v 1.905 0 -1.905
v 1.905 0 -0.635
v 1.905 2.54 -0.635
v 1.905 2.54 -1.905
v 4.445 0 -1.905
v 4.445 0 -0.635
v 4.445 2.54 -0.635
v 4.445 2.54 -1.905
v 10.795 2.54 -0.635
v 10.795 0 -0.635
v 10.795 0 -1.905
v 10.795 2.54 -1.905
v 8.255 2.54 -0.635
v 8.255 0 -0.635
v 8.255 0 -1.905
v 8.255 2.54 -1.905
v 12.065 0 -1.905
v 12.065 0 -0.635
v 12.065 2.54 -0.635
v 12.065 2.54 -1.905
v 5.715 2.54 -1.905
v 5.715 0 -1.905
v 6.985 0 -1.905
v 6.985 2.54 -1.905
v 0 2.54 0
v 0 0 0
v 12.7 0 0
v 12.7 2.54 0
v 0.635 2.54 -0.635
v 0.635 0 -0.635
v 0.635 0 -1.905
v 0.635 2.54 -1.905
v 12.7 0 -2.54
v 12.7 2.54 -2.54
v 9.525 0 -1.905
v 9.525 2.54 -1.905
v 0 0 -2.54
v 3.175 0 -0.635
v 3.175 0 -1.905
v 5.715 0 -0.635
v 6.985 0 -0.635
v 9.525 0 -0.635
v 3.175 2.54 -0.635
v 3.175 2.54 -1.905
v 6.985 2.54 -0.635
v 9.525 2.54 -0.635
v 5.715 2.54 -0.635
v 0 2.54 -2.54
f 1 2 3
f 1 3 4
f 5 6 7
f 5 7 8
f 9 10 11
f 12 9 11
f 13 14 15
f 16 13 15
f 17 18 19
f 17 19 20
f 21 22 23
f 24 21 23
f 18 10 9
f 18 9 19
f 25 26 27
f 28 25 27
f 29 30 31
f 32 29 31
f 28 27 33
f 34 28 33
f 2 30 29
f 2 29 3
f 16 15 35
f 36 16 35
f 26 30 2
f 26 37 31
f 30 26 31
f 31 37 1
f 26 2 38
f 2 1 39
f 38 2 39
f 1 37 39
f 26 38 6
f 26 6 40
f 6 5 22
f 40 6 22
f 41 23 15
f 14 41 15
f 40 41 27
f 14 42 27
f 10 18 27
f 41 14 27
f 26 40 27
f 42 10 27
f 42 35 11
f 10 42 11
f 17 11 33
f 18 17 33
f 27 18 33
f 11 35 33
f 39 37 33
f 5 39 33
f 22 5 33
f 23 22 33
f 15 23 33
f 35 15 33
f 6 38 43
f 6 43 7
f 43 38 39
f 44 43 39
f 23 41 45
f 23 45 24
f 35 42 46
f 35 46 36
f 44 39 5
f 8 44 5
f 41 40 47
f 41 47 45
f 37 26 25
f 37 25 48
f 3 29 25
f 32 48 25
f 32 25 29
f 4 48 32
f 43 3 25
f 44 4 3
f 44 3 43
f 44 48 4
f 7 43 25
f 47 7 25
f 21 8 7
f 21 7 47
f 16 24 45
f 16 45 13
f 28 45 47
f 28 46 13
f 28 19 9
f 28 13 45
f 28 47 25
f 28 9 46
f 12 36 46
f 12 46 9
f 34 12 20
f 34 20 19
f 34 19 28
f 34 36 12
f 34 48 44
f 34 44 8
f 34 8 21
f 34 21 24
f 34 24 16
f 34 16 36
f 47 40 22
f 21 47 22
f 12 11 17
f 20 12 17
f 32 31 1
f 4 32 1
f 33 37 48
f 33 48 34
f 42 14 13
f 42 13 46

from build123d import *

# Parameters (mm, degrees)
SKETCH1_W           = 12.7
SKETCH1_H           = 2.54
SKETCH1_W_2         = 1.27
SKETCH1_H_2         = 1.27
BOSS_EXTRUDE1_DEPTH = 2.54


with BuildPart() as part:
    # Sketch1 → Boss-Extrude1 (new body)
    with BuildSketch(Plane(origin=(0, 0, 0), x_dir=(1, 0, 0), z_dir=(0, 1, 0))):
        with Locations((6.35, 1.27)):
            Rectangle(SKETCH1_W, SKETCH1_H)
        with Locations((3.81, 1.27)):
            Rectangle(SKETCH1_W_2, SKETCH1_H_2, mode=Mode.SUBTRACT)
        with Locations((1.27, 1.27)):
            Rectangle(SKETCH1_W_2, SKETCH1_H_2, mode=Mode.SUBTRACT)
        with Locations((6.35, 1.27)):
            Rectangle(SKETCH1_W_2, SKETCH1_H_2, mode=Mode.SUBTRACT)
        with Locations((8.89, 1.27)):
            Rectangle(SKETCH1_W_2, SKETCH1_H_2, mode=Mode.SUBTRACT)
        with Locations((11.43, 1.27)):
            Rectangle(SKETCH1_W_2, SKETCH1_H_2, mode=Mode.SUBTRACT)
    extrude(amount=BOSS_EXTRUDE1_DEPTH)


solid = part.part
